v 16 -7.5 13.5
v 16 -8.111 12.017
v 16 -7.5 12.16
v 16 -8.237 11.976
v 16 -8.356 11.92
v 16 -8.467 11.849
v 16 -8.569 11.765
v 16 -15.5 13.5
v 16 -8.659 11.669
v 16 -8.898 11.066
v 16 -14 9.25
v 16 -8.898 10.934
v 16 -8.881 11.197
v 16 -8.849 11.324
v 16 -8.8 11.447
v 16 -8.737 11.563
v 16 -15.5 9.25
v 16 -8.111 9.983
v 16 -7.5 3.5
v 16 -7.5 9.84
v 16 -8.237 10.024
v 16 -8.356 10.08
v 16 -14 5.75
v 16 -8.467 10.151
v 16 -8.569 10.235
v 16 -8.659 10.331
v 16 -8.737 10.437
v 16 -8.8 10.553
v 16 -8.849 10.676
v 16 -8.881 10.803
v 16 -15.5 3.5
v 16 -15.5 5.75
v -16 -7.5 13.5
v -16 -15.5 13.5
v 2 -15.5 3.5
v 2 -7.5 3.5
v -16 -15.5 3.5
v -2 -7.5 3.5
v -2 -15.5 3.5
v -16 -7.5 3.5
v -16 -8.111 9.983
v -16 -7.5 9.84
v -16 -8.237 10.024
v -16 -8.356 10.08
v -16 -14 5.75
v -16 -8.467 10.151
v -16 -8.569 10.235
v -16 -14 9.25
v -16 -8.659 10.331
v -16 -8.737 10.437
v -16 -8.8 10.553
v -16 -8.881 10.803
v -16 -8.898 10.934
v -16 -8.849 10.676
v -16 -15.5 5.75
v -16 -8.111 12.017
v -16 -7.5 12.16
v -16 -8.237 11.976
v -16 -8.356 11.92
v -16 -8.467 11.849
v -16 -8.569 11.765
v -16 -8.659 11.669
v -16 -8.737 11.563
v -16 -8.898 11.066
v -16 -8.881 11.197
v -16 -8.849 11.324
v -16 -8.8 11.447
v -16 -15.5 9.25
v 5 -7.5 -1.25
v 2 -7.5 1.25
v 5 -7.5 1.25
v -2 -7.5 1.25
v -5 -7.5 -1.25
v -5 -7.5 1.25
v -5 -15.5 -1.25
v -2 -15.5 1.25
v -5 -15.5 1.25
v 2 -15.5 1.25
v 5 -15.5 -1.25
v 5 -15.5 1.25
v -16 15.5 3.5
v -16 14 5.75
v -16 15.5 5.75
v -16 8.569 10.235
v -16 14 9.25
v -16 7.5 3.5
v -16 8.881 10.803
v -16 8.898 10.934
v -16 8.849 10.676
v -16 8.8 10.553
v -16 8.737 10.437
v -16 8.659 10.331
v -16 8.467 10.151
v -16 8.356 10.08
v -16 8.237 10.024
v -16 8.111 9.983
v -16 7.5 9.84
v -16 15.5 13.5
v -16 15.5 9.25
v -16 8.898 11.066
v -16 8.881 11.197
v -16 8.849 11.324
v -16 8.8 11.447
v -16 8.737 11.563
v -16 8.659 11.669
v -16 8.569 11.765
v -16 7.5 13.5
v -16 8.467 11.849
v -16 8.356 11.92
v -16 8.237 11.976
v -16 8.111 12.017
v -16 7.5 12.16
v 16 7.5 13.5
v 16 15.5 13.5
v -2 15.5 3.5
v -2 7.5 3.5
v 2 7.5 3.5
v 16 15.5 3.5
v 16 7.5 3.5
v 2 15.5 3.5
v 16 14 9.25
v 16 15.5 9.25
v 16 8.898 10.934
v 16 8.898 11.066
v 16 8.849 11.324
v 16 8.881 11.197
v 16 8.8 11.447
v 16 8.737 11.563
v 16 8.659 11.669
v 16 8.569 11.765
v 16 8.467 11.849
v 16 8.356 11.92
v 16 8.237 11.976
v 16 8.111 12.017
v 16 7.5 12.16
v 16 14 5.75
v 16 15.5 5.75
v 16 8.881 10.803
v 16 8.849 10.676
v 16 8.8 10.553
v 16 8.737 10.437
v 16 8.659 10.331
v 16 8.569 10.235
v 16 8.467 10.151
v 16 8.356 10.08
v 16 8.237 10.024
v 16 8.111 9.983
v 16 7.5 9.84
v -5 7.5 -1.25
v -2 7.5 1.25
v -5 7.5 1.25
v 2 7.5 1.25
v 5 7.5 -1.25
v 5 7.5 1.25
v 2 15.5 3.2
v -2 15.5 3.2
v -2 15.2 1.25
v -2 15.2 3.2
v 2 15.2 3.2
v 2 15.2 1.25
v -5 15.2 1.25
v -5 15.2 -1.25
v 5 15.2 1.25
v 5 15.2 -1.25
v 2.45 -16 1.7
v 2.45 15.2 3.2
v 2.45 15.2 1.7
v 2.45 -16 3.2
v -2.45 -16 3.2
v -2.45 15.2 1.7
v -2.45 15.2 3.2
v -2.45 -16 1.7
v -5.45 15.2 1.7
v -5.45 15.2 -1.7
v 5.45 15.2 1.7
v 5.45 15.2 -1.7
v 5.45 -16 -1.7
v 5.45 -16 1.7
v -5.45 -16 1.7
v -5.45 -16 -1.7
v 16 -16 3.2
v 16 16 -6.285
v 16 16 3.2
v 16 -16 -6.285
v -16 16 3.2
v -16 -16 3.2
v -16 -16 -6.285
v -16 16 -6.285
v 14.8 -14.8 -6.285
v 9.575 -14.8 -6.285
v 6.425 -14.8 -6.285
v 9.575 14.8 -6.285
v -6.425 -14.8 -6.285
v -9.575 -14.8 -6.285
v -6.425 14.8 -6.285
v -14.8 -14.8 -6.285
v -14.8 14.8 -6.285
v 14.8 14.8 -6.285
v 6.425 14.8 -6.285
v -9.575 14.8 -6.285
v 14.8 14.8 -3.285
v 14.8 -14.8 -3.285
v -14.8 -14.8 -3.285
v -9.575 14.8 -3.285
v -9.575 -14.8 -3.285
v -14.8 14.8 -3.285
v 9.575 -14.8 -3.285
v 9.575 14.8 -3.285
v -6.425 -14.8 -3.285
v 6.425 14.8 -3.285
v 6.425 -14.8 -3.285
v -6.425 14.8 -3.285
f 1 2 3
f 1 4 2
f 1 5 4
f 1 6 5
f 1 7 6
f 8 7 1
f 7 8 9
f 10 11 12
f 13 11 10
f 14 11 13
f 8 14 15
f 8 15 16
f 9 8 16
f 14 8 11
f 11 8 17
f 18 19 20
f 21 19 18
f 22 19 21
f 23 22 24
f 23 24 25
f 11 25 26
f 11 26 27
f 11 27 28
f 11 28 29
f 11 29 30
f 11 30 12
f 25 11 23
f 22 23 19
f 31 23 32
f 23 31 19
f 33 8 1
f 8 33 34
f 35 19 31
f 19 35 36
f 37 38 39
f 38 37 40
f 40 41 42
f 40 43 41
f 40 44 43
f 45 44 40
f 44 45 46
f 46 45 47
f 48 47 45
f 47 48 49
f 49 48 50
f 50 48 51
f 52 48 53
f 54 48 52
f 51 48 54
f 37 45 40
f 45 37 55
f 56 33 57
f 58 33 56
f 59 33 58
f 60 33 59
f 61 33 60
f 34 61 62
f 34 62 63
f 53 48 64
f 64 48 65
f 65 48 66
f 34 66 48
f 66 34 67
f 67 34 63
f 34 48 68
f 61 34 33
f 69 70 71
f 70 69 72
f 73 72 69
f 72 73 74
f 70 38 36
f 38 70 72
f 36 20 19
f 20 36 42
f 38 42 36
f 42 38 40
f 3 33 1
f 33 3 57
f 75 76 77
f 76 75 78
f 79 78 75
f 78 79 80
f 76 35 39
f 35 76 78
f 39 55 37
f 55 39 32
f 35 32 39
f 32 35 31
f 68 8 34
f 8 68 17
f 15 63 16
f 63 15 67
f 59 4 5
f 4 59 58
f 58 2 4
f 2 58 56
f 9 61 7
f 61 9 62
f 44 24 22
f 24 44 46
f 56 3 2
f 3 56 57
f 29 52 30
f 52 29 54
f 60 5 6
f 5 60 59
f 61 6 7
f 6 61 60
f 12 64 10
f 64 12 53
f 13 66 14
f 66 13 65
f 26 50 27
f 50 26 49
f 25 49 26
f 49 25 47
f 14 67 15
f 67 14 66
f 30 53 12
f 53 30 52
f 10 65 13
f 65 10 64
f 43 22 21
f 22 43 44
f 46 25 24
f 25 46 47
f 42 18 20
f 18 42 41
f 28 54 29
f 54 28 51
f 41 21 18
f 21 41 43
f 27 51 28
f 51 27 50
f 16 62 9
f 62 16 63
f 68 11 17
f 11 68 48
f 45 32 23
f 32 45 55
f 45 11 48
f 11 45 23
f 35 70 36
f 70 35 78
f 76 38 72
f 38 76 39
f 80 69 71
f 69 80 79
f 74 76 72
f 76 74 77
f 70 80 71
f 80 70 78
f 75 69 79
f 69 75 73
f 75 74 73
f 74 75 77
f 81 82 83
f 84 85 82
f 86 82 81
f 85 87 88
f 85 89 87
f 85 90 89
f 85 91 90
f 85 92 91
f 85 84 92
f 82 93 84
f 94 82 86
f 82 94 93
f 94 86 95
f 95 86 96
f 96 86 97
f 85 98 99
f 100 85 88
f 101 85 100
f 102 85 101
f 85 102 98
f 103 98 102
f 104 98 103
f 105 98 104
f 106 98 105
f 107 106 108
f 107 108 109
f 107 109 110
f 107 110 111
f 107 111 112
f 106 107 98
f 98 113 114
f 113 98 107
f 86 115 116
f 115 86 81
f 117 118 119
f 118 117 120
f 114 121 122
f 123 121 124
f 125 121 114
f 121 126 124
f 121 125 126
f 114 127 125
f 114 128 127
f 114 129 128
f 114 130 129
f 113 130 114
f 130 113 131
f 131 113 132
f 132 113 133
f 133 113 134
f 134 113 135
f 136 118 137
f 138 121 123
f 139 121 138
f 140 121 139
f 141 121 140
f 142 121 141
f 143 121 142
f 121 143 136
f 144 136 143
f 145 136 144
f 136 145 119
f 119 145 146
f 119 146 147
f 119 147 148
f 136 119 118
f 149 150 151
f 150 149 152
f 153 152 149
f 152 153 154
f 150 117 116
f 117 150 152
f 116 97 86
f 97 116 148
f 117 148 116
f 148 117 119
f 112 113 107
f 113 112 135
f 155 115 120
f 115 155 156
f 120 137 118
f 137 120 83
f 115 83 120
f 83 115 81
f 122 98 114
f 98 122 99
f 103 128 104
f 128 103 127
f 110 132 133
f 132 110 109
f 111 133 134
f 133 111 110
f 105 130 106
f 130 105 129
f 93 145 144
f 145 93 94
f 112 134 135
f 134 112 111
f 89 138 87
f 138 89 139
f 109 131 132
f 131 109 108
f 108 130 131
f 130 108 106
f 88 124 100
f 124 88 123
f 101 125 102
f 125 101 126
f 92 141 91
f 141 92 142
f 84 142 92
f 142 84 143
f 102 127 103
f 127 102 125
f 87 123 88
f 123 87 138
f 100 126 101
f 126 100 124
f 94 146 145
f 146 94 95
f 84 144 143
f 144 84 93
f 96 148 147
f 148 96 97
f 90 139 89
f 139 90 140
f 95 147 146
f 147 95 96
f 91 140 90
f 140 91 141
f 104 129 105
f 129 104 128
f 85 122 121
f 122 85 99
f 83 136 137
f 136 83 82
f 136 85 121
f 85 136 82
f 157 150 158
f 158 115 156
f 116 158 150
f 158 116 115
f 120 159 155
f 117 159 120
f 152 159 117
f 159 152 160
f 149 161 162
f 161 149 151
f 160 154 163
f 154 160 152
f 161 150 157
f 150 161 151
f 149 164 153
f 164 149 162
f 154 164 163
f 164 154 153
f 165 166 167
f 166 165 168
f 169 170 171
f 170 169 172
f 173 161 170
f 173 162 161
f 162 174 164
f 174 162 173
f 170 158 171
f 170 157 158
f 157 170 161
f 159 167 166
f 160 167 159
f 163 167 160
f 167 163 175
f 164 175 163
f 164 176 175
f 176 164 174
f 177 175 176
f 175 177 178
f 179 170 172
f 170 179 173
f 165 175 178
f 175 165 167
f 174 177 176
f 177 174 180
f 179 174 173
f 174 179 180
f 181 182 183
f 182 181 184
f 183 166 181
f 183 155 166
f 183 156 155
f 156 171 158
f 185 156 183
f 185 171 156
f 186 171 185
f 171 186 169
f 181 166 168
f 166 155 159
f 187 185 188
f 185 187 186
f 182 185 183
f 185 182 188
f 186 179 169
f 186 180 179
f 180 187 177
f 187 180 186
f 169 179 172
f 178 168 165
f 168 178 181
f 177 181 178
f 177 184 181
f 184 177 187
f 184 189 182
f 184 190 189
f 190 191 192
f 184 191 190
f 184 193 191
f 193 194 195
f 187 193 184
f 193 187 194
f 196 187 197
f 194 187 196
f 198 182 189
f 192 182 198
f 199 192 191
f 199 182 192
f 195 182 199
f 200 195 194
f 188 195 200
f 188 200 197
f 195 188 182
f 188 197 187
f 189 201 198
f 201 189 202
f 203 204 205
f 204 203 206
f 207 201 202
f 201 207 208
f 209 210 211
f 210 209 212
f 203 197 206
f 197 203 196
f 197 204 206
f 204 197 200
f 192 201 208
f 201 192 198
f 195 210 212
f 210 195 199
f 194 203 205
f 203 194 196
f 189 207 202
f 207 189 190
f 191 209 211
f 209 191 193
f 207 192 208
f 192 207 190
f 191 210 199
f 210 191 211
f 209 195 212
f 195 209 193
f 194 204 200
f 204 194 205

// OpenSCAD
/*
 * Component Holder.scad
 *
 *
 * NOTES:
 *
 * There are two different parts, the Track (with LEGO compatible fittings
 * on the bottom) and the Jaws which slide in the groove of the track and 
 * are held tight using a rubber band.
 *
 * You will need to print one track and two jaws.
 *
 * The track should be printed standing on end, and the jaws should be 
 * printed face down (with the curved PCB groove) on the bed.
 *
 * INSTRUCTIONS:
 *
 * 1. In the RENDER section set beautyRender to 1 and the rest to 0
 * 
 * 2. In SETTINGS set componentX and componentY to the size of the 
 *    PCB of the component you will be using.
 *
 * 3. In SETTINGS adjust brickX and brickY to be sized appropriately 
 *    to fit the component you added in the first step.
 * 
 * 4. If needed, change slotWidth to a number above 0 to accommodate 
 *    elements that may need clearance on the jaws.
 * 
 * 5. In the RENDER section set only trackRender to 1 and then export
 *    that, and then do the same for jawRender.
 *
 * 
 * Pete Prodoehl <pete@browndoggadgets.com>
 *
 */


/* --- SETTIINGS ---------------------------------------------------------------------------- */

// set the size of the component
componentX = 27;
componentY = 19;

// adjust for the size you need to hold the component
brickX = 4;
brickY = 4;

// do not change these values
trackWidth  = brickX * 8;   // do not change
trackLength = brickY * 8;   // do not change
trackHeight = 5.5;          // do not change
trackMidX   = 4;            // do not change
trackMidZ   = 5;            // do not change
trackBotX   = 10;           // do not change
trackBotZ   = 2.5;          // do not change

// adjust if desired to change the width of the jaws
jawWidth = trackWidth;

// adjusting only affects preview of jaws if needed
jawPreviewSpace = 4.5;  // default to 4.5

// add a slot in the jaw for some components if needed
slotWidth = 0; // set to 0 for no slot

$fn=50;


/* --- RENDER ------------------------------------------------------------------------------- */


// toggle these to affect the preview and rendering
trackRender  = 0;
jawRender    = 0;
beautyRender = 1;



// render commands
if (jawRender) {
	translate([0,0,0/2]) jawPart();
}
if (trackRender) {
	translate([0,0,0/2]) trackPart();
}
if (beautyRender) {
	translate([0,-trackLength/2+jawPreviewSpace,0]) rotate([0,0,0])   color("#0066FF") jawPart();
	translate([0,+trackLength/2-jawPreviewSpace,0]) rotate([0,0,180]) color("#0066FF") jawPart();
	translate([0,0,0]) color("#99AA00") trackPart();
	%translate([0,0,11]) cube([componentX,componentY,1.6], center=true); // component size here
}



/* --- MODULES ------------------------------------------------------------------------------ */

// jawPart is the jaws which hold the component...
//
module jawPart() {

    difference() {
        
        // top of jaw with PCB and rubber band slot cutouts
        translate([0,0,8.5])
            cube([jawWidth,8,10], center=true);
            
        // PCB slot
        hull() {
        
            translate([0,4.75,11])
                rotate([0,90,0])
                    cylinder(d=2.6, h=jawWidth+0.01, center=true);

            translate([0,3.65,11])
                rotate([0,90,0])
                    cylinder(d=2.1, h=jawWidth+0.01, center=true);                
                
        }
            
        // rubber band slot
        translate([0,-4.5,7.5])
            cube([jawWidth+0.01,4,3.5], center=true);
            
        // slot if included
        translate([0,0,13.85])
            cube([slotWidth,10,5.75], center=true);
      
    }

	// inverted T at the bottom of the jaw
    translate([0,0,0])
        guidePart();

}

/* ------------------------------------------------------------------------------------------ */

// trackPart is the basic track sized as specified
// with the guideSlot cut out from it...
//
module trackPart() {
    
    difference() {

        translate([0,0,-trackHeight/2+3.2])
            cube([trackWidth,trackLength,trackHeight], center=true);
            
        translate([0,-0.8,0])
           guideSlot();

    }
    
    // LEGO compatible bottom portion
    translate([0,0,-4.285])
        Lego_Maker(brickY, brickX);
	
} // end trackPart

/* ------------------------------------------------------------------------------------------ */

// guidePart is the inverted T at the bottom of the jaw that fits into the slot/groove
// in the trackPart which gets created by cutting out the guideSlot...
//
module guidePart() {

    variance = 0;
    trackLength = 8; 

    // middle
    translate([0,0,3])
        color("#00FF33")
            cube([trackMidX+variance,trackLength,trackMidZ+variance], center=true);
    
    // bottom
    translate([0,0,0])
        color("#33AA66")
            cube([trackBotX+variance,trackLength,trackBotZ+variance], center=true);
        
}  // end guidePart

/* ------------------------------------------------------------------------------------------ */

// guideSlot is the cutout part from the trackPart which creates the slot/groove 
// that the guidePart fits into and slides in...
//
module guideSlot() {
    
    variance = 0.9;
    
    // middle
    translate([0,0,3])
        color("#996600")
            cube([trackMidX+variance,trackLength,trackMidZ+variance], center=true);
            
    // bottom
    translate([0,0,0])
        color("#999900")
            cube([trackBotX+variance,trackLength,trackBotZ+variance], center=true);
        
}  // end guideSlot

/* ------------------------------------------------------------------------------------------ */

// Lego_Maker creates the modified LEGO brick-like part at the bottom of the holder...
//
module Lego_Maker(width, length) {

	unit_height   = 4;    // height of main brick
	unit_width    = 8;    // width of one LEGO Unit
    wall_width_x2 = 3.15; // double wall width
    
    difference() {
    
        translate([0,0,0])
            cube([length*unit_width, width*unit_width, unit_height], center=true);
    
        translate([0,0,-1])
            cube([length*unit_width-2.4, width*unit_width-2.4, unit_height], center=true);

    }
    
    translate([trackWidth/2-unit_width,0,0])
        cube([wall_width_x2, width*unit_width, unit_height], center=true);
        
    translate([-trackWidth/2+unit_width,0,0])
        cube([wall_width_x2, width*unit_width, unit_height], center=true);

}  // end Lego_Maker

/* ------------------------------------------------------------------------------------------ */
